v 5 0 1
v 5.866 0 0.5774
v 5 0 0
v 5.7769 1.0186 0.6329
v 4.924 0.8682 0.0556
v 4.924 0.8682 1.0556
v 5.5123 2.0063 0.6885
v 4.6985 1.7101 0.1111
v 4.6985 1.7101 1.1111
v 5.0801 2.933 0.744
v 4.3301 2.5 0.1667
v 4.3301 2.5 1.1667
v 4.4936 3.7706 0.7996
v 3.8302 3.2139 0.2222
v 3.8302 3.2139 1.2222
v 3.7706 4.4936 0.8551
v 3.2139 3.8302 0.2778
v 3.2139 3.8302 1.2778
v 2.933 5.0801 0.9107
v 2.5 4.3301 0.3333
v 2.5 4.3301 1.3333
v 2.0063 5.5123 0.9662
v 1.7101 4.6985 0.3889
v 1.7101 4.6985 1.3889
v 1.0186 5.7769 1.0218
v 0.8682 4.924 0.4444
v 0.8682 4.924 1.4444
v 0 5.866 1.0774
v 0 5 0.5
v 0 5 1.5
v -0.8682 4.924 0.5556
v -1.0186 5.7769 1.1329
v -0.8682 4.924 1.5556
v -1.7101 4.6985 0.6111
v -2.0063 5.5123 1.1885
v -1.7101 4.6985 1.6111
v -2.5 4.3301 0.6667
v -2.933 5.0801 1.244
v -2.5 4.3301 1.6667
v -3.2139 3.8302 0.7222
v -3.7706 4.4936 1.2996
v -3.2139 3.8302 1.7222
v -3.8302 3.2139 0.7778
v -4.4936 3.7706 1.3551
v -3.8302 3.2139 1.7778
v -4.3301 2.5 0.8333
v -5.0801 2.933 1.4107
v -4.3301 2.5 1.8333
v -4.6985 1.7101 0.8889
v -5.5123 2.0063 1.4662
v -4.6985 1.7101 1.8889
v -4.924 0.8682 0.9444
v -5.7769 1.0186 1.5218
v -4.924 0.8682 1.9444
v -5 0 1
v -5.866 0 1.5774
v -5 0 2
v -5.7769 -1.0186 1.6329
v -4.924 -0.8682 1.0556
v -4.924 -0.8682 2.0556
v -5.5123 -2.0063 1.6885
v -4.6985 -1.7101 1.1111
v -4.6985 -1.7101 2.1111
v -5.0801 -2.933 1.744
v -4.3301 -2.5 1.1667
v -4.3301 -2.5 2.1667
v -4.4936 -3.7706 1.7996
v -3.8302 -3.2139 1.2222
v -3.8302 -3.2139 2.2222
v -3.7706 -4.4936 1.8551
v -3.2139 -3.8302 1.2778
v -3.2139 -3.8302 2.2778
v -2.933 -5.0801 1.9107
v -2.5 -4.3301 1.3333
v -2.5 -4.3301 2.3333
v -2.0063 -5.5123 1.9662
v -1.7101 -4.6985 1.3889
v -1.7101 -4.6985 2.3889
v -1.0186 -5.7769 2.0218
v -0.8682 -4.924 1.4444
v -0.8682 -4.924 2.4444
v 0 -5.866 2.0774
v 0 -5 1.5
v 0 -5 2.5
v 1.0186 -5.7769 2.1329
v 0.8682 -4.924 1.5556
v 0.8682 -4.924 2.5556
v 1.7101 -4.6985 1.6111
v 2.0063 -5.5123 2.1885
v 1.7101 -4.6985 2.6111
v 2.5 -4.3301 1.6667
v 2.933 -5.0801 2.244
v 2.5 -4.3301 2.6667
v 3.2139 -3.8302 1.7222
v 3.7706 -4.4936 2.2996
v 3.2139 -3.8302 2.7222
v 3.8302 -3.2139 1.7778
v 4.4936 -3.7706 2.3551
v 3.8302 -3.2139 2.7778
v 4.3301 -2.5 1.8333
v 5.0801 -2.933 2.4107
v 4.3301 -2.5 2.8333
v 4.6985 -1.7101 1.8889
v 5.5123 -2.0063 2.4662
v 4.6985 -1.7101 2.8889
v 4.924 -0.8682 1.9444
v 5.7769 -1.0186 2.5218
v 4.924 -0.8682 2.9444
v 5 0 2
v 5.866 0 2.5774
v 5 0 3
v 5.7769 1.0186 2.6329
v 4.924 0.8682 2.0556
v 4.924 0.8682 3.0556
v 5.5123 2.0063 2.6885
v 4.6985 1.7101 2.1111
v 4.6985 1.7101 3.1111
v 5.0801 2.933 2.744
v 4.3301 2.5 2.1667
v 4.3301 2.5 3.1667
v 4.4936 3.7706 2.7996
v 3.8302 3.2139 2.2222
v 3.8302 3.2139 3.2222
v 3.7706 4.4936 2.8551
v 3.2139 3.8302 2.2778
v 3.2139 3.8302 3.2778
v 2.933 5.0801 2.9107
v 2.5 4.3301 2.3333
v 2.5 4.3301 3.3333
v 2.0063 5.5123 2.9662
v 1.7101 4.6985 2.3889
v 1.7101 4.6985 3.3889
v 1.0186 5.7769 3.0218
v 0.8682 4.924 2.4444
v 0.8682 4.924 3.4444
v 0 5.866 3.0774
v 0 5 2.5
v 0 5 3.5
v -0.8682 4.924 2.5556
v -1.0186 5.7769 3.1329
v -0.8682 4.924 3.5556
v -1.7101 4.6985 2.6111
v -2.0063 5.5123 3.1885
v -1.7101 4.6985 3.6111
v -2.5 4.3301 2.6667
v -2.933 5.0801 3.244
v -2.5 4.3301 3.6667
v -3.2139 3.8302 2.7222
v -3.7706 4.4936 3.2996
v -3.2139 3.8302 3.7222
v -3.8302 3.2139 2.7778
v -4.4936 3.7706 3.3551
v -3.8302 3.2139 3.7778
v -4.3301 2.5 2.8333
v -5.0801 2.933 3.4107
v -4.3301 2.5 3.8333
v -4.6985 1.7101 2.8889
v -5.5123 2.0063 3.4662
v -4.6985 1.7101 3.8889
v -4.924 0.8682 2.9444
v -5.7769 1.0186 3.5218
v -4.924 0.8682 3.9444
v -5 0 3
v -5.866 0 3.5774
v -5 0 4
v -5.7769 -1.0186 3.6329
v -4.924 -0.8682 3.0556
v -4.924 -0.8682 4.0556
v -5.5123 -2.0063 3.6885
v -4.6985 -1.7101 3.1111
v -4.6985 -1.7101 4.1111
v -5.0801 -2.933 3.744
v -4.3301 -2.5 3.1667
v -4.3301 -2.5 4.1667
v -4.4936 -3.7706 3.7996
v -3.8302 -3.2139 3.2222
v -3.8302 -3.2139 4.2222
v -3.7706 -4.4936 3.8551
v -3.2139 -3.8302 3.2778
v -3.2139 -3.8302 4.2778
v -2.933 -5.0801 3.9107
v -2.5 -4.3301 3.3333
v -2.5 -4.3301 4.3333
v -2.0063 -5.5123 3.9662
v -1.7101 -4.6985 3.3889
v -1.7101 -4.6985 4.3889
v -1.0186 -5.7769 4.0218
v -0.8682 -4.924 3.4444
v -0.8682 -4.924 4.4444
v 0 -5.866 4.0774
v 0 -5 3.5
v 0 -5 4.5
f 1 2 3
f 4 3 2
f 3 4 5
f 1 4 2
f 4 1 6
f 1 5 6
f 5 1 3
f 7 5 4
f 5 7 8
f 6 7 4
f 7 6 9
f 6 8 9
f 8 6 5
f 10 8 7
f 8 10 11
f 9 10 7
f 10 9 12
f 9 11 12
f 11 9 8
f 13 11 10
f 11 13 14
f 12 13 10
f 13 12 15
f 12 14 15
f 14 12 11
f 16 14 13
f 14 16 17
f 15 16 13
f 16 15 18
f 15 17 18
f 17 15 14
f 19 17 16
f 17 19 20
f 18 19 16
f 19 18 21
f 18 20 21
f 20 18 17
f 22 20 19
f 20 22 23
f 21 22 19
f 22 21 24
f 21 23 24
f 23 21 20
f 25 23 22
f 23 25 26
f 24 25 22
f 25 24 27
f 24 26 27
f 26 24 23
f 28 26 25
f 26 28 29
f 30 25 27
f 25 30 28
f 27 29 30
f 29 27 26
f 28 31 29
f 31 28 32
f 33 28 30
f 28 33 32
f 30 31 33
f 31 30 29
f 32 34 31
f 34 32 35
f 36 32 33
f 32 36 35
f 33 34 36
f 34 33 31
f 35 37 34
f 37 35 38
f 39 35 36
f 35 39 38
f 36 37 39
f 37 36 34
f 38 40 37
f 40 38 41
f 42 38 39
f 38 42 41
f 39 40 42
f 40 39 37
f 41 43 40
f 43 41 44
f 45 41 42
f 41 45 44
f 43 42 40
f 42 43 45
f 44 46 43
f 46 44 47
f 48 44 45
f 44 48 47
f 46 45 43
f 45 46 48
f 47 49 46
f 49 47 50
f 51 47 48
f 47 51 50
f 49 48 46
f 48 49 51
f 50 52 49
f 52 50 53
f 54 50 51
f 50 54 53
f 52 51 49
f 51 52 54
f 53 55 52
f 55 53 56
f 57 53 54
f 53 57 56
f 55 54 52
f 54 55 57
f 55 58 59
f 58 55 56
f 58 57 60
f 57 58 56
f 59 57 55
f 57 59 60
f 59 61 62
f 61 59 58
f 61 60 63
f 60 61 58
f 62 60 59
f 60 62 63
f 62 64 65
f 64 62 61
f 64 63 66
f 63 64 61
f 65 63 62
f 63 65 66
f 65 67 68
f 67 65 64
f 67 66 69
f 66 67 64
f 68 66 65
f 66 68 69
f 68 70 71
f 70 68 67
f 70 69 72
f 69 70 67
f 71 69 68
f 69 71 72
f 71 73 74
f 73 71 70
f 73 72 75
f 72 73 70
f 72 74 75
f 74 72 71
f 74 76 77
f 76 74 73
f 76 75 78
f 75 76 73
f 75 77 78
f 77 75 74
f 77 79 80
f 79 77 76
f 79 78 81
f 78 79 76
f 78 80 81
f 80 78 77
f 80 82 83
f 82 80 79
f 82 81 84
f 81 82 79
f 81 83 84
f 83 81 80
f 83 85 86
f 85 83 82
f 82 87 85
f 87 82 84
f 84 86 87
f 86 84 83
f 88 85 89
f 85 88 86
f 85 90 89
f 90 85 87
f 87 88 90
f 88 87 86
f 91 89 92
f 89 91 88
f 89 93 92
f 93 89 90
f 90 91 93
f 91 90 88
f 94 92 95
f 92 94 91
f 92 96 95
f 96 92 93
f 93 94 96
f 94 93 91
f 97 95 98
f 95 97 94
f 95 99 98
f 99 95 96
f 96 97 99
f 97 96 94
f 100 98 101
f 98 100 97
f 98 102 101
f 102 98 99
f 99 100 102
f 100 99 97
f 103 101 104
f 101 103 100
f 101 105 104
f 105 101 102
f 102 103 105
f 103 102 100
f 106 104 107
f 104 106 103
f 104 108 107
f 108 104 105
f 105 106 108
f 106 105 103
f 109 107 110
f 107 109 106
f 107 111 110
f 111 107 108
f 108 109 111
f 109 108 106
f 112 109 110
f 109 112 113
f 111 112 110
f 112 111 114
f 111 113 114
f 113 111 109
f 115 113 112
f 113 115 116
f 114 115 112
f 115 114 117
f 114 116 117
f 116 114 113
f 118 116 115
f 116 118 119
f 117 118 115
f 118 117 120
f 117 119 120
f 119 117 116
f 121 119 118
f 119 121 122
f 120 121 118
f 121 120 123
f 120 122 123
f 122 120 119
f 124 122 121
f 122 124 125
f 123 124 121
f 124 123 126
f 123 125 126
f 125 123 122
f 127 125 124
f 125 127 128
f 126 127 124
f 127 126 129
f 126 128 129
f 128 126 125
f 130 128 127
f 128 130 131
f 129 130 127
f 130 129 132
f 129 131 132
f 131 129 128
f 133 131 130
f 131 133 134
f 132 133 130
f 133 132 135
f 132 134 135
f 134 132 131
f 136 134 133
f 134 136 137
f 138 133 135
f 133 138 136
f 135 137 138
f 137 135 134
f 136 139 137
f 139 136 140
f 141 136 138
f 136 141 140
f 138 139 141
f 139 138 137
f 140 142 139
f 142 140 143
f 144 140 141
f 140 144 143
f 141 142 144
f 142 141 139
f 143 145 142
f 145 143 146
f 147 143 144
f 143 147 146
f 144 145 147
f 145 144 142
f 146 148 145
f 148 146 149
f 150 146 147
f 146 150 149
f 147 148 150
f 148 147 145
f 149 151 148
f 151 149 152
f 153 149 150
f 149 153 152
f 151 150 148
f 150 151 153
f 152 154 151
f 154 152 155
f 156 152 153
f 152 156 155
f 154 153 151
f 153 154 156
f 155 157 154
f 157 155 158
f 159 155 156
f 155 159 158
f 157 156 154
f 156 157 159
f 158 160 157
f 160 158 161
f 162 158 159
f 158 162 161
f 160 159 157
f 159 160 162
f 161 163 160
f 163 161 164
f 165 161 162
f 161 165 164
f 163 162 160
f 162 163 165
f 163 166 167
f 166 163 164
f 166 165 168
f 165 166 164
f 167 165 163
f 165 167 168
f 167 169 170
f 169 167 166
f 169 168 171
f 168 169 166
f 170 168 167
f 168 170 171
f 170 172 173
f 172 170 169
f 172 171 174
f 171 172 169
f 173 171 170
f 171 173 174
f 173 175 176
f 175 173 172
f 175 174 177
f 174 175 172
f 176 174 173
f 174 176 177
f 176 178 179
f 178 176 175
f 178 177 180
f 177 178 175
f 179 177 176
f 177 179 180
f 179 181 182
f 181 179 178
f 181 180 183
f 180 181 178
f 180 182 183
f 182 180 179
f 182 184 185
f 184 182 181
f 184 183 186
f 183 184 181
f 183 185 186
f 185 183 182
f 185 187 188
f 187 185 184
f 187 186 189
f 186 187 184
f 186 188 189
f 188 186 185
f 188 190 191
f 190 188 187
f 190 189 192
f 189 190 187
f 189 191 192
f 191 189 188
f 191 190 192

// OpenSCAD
/*************************************************
/ Written by Simon Löffler 2020					 /
/												 /
/ This module lets you sweep a custom 2D Profile /
/ along a helical path.							 /
/ The profile is an array of points just like a	 /
/ polygon() [[x0,z0],[x1,z1],[x2,z2],...] where	 /
/ x=0 is at the radius of the helix.			 /
/ You can select out of 5 different modes to	 /
/ describe the helix.							 /
/												 /
/ +------+--------+--------+					 /
/ | mode | param1 | param2 |					 /
/ +------+--------+--------+					 /
/ | 1    | pitch  | height |					 /
/ | 2    | pitch  | turns  |					 /
/ | 3    | alpha  | height |					 /
/ | 4    | alpha  | turns  |					 /
/ | 5    | turns  | height |					 /
/ +------+--------+--------+					 /
/ |  alpha is helix angle  |					 /
/ +------------------------+					 /
*************************************************/

module helix_extrude(
	profile,
	radius,
	param1,
	param2,
	mode=1,
	fn=($fn==0?36:$fn)
){
    if(mode<0||mode>5)
		echo(str(
			"ERROR: There is no mode ",mode,"!"
		));

    if(profile==undef||len(profile)<3)
		echo(str(
			"ERROR: profile is missing!"
		));

    if(param1==undef)
		echo(str(
			"ERROR: param1 is missing!"
		));

    if(param2==undef)
		echo(str(
			"ERROR: param2 is missing!"
		));

    pitch=(
        mode==1?param1:(
            mode==2?param1:(
                mode==3?radius*2*tan(param1):(
                    mode==4?radius*2*tan(param1):(
                        mode==5?param2/param1:(
							undef
						)
                    )
                )
            )
        )
    );

    height=(
        mode==1?param2:(
            mode==2?pitch*param2:(
                mode==3?param2:(
                    mode==4?pitch*param2:(
                        mode==5?param2:(
							undef
						)
                    )
                )
            )
        )
    );

    points=[
        for(a=[0:360/fn:height/pitch*360])(
            for(p=[0:len(profile)-1])(
                let(x=0,y=x,z=1)[
                    (profile[p][x]+radius)*cos(a),
                    (profile[p][y]+radius)*sin(a),
                    profile[p][z]+a/360*pitch
                ]
            )
        )   
    ];

	n=len(profile);
	p=len(points);
	faces=[
        [for(point=[0:1:n-1])
            point
        ],
        for(point=[0:n:p-n-1])(
            for(side=[0:n-1])(
                let(offset1=point+side,offset2=n)[
                    offset1,
                    offset1+offset2,
                    (side==n-1?
                        offset1+1
                    :
                        offset1+offset2+1
                    ),
                    (side==n-1?
                        offset1-offset2+1
                    :
                        offset1+1
                    )
                ]
                
            )
        ),
        [for(point=[p-1:-1:p-n])
            point,
        ]
    ];

    polyhedron(points,faces,10);
}

// Example, please remove before use!
helix_extrude([[0,0],[sin(60),tan(30)],[0,1]],5,2,3.5);
